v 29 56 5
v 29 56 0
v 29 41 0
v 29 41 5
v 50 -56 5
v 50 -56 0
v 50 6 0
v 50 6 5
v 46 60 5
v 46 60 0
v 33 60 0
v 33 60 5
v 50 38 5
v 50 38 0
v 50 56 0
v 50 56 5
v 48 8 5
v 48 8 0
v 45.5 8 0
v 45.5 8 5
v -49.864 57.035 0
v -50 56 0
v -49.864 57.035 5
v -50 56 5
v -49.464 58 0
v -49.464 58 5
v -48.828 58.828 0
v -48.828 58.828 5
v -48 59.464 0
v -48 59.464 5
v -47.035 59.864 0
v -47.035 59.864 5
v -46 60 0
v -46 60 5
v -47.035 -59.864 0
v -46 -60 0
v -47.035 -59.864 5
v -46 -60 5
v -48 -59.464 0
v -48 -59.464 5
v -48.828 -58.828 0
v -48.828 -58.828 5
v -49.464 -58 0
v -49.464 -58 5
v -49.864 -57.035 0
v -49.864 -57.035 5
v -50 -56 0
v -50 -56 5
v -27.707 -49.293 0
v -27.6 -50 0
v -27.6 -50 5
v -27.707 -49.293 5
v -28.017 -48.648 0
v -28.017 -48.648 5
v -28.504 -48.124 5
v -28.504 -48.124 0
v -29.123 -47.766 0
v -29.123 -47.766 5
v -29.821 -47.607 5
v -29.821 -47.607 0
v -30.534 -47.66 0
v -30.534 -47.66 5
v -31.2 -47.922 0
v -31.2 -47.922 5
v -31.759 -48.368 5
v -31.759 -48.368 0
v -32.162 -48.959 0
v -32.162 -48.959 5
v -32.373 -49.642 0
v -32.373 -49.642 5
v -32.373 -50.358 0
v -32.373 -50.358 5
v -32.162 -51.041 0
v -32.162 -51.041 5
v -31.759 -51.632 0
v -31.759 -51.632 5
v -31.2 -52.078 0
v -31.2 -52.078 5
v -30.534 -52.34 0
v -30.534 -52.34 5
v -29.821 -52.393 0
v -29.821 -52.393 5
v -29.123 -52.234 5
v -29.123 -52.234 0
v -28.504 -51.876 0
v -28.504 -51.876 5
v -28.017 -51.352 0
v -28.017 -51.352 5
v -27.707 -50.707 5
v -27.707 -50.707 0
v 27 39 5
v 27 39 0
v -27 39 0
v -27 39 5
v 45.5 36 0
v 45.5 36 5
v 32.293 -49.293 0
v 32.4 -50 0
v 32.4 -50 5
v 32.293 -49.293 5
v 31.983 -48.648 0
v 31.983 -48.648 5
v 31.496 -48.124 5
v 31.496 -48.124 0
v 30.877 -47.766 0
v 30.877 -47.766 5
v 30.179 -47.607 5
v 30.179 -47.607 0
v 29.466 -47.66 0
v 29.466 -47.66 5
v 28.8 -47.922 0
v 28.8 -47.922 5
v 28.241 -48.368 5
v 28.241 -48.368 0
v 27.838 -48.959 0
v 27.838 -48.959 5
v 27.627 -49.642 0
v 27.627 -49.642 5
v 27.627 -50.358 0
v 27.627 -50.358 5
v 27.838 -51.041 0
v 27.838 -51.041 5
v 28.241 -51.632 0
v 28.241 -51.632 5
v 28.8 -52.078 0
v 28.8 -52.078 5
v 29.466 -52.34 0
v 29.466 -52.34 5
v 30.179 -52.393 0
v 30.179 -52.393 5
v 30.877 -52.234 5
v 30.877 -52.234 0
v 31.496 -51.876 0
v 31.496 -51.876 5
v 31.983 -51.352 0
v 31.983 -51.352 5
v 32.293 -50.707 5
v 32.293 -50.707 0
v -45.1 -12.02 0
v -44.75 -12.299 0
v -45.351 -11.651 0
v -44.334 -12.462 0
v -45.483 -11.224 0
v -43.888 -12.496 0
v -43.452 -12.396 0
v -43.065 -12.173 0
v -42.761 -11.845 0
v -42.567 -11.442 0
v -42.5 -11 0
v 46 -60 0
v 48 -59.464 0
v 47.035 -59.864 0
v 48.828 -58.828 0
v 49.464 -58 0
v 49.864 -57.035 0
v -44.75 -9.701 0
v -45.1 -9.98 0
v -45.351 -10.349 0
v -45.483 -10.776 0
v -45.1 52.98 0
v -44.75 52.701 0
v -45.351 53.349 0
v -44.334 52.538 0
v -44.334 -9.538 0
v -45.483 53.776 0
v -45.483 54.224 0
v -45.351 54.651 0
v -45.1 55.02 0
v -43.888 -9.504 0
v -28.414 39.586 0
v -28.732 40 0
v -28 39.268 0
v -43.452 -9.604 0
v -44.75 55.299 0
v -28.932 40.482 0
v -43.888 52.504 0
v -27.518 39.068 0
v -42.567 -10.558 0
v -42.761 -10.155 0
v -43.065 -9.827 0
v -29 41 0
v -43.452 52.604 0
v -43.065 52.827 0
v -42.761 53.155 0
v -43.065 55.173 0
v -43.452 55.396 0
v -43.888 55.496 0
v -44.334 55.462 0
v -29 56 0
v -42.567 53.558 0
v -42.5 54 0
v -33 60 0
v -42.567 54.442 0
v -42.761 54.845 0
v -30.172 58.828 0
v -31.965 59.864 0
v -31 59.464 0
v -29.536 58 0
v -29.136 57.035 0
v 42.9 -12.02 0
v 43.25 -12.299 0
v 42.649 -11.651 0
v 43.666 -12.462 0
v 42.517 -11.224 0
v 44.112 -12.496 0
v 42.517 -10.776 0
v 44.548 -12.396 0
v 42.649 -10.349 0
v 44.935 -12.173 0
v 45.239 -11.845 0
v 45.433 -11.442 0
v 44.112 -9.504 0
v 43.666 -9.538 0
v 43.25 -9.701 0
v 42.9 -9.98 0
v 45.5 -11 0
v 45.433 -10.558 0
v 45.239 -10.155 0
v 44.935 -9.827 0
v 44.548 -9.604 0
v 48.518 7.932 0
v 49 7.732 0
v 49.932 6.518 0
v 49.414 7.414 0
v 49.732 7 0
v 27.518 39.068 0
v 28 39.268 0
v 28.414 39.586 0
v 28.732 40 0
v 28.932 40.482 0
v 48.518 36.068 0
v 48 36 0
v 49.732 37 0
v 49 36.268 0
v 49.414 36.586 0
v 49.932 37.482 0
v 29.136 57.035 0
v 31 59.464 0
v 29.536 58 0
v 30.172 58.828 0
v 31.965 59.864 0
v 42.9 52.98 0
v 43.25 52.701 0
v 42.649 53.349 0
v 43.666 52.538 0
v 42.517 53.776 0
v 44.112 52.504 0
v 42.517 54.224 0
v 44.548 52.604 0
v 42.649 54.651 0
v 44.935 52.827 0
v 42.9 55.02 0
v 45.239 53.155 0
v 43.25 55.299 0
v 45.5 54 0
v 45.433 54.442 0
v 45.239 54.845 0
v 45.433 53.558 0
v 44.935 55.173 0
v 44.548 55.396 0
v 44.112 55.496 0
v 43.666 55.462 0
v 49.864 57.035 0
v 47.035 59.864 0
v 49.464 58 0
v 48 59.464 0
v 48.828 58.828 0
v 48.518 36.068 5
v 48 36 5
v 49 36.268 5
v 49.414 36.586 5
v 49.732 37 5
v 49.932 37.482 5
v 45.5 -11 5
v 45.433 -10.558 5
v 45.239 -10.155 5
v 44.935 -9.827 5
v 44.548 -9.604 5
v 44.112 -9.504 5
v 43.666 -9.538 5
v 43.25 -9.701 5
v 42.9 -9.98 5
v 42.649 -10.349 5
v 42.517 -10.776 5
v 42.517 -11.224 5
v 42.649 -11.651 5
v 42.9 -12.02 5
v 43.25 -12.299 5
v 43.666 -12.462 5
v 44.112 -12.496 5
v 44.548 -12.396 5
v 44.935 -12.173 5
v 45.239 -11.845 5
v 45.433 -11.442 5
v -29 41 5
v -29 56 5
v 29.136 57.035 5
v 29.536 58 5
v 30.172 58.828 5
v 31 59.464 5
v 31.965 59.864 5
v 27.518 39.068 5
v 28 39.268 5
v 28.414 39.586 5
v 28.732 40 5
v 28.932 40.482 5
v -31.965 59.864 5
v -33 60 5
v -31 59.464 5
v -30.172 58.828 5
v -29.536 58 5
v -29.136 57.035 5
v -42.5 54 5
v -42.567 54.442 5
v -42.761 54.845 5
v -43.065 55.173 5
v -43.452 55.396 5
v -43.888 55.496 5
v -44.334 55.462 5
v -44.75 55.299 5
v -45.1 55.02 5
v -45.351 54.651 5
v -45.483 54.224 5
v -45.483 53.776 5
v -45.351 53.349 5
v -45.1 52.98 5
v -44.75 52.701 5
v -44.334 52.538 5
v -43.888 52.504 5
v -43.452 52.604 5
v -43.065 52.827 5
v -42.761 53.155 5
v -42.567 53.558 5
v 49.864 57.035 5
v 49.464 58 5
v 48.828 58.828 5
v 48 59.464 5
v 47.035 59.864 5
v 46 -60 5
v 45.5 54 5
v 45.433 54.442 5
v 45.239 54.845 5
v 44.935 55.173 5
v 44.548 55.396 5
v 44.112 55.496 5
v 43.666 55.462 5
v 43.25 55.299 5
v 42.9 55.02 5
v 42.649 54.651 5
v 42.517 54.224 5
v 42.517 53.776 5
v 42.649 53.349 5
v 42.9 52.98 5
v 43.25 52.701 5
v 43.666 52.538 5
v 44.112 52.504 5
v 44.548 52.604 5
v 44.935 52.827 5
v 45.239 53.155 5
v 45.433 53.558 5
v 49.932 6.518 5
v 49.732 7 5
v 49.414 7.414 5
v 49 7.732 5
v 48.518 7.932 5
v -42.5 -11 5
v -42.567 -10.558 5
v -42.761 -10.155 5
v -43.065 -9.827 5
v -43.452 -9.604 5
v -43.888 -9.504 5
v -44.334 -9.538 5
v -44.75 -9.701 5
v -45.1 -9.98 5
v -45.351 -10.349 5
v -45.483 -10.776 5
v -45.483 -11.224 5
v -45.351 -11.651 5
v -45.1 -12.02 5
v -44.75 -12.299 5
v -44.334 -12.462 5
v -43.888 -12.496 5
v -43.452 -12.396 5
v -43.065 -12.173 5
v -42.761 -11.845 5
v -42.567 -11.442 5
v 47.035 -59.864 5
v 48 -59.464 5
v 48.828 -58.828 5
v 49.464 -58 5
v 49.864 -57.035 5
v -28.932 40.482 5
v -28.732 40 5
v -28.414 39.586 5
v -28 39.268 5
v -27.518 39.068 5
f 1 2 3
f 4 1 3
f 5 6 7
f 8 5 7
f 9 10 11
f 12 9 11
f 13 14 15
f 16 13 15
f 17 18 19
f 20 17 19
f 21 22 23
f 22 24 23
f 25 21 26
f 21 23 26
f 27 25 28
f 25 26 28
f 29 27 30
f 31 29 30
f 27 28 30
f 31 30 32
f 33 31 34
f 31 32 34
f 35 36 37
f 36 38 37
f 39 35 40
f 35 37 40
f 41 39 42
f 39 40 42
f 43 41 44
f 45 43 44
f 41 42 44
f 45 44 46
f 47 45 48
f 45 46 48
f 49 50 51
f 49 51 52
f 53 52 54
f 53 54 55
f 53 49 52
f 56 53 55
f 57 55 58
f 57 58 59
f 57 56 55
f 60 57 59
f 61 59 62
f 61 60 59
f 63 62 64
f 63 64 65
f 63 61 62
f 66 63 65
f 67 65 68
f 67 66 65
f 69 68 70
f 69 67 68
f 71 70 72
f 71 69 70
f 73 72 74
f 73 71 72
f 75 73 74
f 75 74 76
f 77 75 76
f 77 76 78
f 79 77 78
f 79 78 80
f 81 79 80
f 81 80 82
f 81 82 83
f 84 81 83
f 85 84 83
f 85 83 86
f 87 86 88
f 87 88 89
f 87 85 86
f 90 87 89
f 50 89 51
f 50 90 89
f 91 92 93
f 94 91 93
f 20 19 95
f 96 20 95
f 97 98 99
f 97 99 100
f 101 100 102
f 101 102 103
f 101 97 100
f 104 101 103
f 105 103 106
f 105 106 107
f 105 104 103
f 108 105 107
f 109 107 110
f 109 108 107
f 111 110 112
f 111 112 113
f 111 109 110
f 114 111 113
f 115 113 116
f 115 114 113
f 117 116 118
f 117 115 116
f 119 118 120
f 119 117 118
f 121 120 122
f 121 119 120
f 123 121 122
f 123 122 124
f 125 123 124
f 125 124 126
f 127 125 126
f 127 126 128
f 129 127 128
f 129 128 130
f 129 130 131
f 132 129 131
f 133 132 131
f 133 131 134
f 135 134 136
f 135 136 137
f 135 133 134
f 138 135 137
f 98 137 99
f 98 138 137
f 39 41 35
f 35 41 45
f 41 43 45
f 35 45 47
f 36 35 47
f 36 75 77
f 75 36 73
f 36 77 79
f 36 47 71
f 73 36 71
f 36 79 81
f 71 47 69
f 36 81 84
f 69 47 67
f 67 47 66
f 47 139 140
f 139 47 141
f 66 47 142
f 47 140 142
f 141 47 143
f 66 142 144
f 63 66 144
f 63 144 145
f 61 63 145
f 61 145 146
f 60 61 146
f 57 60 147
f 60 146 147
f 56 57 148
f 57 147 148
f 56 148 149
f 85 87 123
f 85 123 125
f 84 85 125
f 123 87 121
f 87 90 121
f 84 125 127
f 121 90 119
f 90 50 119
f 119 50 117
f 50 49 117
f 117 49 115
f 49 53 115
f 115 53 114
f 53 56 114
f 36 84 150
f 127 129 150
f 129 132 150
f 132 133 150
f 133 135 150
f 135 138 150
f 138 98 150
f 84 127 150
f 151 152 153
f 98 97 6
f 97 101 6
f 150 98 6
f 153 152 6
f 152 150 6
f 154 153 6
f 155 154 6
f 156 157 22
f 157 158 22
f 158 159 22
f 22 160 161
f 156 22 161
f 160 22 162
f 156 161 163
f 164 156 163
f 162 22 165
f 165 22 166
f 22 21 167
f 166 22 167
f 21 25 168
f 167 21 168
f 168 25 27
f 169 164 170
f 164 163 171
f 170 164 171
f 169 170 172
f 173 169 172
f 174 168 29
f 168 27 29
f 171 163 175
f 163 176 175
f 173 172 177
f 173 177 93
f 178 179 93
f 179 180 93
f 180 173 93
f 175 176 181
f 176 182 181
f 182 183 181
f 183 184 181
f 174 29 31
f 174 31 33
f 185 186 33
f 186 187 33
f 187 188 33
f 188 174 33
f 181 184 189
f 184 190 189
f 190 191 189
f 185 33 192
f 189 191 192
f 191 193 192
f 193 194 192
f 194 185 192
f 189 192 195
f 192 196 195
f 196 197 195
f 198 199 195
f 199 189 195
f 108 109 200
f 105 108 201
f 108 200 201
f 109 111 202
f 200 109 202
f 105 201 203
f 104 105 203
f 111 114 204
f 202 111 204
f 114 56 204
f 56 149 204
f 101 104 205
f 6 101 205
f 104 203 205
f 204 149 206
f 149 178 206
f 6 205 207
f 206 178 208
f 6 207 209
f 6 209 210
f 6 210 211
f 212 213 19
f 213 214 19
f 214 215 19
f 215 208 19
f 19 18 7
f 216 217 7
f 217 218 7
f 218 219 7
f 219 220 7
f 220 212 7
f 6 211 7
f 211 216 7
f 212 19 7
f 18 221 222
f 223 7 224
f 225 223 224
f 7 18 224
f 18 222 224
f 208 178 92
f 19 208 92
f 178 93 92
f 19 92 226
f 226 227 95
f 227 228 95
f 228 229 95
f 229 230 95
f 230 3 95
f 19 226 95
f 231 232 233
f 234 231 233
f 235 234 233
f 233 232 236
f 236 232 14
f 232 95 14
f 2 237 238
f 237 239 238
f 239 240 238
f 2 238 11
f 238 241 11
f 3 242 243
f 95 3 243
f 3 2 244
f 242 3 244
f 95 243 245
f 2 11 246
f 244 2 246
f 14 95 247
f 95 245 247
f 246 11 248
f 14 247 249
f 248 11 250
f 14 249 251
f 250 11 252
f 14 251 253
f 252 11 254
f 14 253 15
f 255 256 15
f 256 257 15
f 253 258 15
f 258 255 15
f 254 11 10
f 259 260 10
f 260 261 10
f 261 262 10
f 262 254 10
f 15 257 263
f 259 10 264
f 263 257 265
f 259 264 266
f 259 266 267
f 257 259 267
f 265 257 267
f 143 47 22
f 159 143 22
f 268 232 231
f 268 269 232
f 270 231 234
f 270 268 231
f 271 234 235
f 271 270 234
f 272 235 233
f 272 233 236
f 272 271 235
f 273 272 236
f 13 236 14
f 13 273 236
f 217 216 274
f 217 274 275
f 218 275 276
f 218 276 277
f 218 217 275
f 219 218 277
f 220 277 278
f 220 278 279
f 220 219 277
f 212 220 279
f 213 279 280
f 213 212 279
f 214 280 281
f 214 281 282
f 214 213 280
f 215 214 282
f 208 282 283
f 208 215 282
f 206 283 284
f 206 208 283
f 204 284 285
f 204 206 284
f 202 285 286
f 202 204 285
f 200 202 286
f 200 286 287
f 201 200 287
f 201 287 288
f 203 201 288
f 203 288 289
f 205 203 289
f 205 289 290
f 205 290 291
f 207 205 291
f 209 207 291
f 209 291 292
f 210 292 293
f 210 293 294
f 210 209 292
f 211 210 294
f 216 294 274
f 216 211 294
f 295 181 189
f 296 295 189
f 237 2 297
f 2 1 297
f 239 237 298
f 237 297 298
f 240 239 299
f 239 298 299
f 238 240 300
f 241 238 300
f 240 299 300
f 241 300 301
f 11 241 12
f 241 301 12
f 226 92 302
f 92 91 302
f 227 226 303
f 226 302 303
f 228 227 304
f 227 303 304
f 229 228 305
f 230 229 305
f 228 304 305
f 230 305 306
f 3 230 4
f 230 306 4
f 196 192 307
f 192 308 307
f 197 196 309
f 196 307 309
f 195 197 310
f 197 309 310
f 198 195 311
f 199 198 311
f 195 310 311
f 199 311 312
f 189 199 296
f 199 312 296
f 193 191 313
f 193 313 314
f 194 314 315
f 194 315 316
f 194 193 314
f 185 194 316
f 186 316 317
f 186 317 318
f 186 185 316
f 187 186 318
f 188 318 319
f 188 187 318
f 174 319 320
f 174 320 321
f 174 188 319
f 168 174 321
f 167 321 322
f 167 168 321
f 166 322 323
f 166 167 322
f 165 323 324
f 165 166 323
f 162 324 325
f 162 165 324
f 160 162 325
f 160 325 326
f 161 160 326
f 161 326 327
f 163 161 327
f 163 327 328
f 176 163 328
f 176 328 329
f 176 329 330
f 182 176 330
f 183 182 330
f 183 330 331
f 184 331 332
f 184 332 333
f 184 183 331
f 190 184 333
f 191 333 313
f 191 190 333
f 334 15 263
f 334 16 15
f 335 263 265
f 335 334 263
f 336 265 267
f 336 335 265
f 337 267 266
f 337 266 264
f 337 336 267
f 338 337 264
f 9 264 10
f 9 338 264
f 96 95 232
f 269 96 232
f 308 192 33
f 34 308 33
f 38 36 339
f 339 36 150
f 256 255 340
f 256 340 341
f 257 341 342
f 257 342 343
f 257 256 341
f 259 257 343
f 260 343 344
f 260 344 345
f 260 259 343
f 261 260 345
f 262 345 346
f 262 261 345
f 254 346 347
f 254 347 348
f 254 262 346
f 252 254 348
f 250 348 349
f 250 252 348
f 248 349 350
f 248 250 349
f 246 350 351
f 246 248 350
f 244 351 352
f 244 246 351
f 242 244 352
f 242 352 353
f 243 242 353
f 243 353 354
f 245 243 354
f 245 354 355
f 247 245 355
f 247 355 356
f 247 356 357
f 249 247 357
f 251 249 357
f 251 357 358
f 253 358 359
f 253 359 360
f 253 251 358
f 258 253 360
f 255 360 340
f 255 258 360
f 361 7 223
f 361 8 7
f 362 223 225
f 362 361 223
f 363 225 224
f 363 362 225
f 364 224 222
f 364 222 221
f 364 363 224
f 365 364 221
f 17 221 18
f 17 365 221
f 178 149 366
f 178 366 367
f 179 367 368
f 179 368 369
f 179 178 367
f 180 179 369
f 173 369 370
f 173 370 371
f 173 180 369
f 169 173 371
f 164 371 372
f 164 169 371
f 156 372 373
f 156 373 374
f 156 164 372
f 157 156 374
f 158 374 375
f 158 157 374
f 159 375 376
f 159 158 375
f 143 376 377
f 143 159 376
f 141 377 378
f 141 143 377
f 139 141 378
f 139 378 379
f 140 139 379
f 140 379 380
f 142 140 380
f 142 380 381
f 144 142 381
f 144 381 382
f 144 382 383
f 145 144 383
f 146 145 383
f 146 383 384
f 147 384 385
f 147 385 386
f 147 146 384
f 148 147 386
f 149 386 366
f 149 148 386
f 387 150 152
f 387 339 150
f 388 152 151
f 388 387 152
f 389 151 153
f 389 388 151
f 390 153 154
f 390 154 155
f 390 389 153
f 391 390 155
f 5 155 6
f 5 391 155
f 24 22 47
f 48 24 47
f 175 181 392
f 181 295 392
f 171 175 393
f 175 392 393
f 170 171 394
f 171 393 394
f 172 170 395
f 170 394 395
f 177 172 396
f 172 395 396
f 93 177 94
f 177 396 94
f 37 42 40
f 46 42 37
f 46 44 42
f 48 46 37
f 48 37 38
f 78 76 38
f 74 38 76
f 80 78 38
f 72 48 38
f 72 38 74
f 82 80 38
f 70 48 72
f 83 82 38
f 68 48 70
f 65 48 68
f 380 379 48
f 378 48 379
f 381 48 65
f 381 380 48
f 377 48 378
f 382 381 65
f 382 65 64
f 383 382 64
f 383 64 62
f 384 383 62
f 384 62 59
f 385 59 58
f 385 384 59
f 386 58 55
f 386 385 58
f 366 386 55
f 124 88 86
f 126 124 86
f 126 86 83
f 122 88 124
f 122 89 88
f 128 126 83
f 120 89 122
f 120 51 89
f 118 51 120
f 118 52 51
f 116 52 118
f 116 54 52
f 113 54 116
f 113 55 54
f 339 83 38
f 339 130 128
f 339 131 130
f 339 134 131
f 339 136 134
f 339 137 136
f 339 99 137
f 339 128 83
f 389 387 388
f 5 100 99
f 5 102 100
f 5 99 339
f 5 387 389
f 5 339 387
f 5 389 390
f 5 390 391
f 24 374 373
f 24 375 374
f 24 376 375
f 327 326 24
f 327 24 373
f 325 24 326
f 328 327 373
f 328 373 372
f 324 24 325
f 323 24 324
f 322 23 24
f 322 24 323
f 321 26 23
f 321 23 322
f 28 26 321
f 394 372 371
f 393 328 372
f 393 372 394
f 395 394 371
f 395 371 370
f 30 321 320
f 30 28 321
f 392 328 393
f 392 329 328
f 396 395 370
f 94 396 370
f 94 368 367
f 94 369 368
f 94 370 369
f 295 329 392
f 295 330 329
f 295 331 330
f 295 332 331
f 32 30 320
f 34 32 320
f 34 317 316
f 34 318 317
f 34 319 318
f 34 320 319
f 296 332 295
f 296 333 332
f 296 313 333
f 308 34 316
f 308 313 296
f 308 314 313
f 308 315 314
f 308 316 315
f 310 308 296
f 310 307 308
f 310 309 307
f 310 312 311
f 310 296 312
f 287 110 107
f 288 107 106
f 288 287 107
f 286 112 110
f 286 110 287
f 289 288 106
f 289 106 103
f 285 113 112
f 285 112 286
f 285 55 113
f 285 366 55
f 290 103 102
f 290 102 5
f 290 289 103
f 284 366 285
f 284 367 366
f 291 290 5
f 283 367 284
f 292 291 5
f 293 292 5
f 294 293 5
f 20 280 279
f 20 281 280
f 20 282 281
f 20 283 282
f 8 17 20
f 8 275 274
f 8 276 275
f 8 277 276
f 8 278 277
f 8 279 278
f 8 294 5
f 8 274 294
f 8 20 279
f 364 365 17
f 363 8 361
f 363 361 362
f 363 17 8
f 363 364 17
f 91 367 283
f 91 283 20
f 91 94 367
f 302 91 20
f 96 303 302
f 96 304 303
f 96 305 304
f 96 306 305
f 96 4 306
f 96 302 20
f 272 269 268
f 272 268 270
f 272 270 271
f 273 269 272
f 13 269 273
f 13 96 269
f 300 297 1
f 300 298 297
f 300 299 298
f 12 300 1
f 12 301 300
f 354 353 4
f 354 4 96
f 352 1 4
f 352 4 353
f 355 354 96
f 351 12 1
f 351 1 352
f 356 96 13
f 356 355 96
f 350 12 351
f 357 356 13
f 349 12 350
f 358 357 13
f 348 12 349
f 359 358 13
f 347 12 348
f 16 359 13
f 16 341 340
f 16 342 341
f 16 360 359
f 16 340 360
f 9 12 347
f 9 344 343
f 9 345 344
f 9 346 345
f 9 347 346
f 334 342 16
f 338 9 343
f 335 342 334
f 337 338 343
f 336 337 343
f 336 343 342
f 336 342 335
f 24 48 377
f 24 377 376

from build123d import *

# Parameters (mm, degrees)
SKETCH1_R           = 2.4
SKETCH1_R_2         = 1.5
BOSS_EXTRUDE1_DEPTH = 5
FILLET1_R           = 4
FILLET2_R           = 2


with BuildPart() as part:
    # Sketch1 → Boss-Extrude1 (new body)
    with BuildSketch(Plane.XY):
        Polygon((-50, -60), (50, -60), (50, 8), (45.5, 8), (45.5, 36), (50, 36), (50, 60), (29, 60), (29, 39), (-29, 39), (-29, 60), (-50, 60), align=None)
        with Locations((-30, -50)):
            Circle(SKETCH1_R, mode=Mode.SUBTRACT)
        with Locations((30, -50)):
            Circle(SKETCH1_R, mode=Mode.SUBTRACT)
        with Locations((-44, 54)):
            Circle(SKETCH1_R_2, mode=Mode.SUBTRACT)
        with Locations((44, 54)):
            Circle(SKETCH1_R_2, mode=Mode.SUBTRACT)
        with Locations((-44, -11)):
            Circle(SKETCH1_R_2, mode=Mode.SUBTRACT)
        with Locations((44, -11)):
            Circle(SKETCH1_R_2, mode=Mode.SUBTRACT)
    extrude(amount=BOSS_EXTRUDE1_DEPTH)

    # Fillet1
    fillet1_edges = [part.edges().sort_by_distance(p)[0] for p in [
        (50, -60, 2.5),
        (-50, -60, 2.5),
        (-50, 60, 2.5),
        (-29, 60, 2.5),
        (29, 60, 2.5),
        (50, 60, 2.5),
    ]]
    fillet(fillet1_edges, radius=FILLET1_R)

    # Fillet2
    fillet2_edges = [part.edges().sort_by_distance(p)[0] for p in [
        (50, 36, 2.5),
        (50, 8, 2.5),
        (-29, 39, 2.5),
        (29, 39, 2.5),
    ]]
    fillet(fillet2_edges, radius=FILLET2_R)


solid = part.part
